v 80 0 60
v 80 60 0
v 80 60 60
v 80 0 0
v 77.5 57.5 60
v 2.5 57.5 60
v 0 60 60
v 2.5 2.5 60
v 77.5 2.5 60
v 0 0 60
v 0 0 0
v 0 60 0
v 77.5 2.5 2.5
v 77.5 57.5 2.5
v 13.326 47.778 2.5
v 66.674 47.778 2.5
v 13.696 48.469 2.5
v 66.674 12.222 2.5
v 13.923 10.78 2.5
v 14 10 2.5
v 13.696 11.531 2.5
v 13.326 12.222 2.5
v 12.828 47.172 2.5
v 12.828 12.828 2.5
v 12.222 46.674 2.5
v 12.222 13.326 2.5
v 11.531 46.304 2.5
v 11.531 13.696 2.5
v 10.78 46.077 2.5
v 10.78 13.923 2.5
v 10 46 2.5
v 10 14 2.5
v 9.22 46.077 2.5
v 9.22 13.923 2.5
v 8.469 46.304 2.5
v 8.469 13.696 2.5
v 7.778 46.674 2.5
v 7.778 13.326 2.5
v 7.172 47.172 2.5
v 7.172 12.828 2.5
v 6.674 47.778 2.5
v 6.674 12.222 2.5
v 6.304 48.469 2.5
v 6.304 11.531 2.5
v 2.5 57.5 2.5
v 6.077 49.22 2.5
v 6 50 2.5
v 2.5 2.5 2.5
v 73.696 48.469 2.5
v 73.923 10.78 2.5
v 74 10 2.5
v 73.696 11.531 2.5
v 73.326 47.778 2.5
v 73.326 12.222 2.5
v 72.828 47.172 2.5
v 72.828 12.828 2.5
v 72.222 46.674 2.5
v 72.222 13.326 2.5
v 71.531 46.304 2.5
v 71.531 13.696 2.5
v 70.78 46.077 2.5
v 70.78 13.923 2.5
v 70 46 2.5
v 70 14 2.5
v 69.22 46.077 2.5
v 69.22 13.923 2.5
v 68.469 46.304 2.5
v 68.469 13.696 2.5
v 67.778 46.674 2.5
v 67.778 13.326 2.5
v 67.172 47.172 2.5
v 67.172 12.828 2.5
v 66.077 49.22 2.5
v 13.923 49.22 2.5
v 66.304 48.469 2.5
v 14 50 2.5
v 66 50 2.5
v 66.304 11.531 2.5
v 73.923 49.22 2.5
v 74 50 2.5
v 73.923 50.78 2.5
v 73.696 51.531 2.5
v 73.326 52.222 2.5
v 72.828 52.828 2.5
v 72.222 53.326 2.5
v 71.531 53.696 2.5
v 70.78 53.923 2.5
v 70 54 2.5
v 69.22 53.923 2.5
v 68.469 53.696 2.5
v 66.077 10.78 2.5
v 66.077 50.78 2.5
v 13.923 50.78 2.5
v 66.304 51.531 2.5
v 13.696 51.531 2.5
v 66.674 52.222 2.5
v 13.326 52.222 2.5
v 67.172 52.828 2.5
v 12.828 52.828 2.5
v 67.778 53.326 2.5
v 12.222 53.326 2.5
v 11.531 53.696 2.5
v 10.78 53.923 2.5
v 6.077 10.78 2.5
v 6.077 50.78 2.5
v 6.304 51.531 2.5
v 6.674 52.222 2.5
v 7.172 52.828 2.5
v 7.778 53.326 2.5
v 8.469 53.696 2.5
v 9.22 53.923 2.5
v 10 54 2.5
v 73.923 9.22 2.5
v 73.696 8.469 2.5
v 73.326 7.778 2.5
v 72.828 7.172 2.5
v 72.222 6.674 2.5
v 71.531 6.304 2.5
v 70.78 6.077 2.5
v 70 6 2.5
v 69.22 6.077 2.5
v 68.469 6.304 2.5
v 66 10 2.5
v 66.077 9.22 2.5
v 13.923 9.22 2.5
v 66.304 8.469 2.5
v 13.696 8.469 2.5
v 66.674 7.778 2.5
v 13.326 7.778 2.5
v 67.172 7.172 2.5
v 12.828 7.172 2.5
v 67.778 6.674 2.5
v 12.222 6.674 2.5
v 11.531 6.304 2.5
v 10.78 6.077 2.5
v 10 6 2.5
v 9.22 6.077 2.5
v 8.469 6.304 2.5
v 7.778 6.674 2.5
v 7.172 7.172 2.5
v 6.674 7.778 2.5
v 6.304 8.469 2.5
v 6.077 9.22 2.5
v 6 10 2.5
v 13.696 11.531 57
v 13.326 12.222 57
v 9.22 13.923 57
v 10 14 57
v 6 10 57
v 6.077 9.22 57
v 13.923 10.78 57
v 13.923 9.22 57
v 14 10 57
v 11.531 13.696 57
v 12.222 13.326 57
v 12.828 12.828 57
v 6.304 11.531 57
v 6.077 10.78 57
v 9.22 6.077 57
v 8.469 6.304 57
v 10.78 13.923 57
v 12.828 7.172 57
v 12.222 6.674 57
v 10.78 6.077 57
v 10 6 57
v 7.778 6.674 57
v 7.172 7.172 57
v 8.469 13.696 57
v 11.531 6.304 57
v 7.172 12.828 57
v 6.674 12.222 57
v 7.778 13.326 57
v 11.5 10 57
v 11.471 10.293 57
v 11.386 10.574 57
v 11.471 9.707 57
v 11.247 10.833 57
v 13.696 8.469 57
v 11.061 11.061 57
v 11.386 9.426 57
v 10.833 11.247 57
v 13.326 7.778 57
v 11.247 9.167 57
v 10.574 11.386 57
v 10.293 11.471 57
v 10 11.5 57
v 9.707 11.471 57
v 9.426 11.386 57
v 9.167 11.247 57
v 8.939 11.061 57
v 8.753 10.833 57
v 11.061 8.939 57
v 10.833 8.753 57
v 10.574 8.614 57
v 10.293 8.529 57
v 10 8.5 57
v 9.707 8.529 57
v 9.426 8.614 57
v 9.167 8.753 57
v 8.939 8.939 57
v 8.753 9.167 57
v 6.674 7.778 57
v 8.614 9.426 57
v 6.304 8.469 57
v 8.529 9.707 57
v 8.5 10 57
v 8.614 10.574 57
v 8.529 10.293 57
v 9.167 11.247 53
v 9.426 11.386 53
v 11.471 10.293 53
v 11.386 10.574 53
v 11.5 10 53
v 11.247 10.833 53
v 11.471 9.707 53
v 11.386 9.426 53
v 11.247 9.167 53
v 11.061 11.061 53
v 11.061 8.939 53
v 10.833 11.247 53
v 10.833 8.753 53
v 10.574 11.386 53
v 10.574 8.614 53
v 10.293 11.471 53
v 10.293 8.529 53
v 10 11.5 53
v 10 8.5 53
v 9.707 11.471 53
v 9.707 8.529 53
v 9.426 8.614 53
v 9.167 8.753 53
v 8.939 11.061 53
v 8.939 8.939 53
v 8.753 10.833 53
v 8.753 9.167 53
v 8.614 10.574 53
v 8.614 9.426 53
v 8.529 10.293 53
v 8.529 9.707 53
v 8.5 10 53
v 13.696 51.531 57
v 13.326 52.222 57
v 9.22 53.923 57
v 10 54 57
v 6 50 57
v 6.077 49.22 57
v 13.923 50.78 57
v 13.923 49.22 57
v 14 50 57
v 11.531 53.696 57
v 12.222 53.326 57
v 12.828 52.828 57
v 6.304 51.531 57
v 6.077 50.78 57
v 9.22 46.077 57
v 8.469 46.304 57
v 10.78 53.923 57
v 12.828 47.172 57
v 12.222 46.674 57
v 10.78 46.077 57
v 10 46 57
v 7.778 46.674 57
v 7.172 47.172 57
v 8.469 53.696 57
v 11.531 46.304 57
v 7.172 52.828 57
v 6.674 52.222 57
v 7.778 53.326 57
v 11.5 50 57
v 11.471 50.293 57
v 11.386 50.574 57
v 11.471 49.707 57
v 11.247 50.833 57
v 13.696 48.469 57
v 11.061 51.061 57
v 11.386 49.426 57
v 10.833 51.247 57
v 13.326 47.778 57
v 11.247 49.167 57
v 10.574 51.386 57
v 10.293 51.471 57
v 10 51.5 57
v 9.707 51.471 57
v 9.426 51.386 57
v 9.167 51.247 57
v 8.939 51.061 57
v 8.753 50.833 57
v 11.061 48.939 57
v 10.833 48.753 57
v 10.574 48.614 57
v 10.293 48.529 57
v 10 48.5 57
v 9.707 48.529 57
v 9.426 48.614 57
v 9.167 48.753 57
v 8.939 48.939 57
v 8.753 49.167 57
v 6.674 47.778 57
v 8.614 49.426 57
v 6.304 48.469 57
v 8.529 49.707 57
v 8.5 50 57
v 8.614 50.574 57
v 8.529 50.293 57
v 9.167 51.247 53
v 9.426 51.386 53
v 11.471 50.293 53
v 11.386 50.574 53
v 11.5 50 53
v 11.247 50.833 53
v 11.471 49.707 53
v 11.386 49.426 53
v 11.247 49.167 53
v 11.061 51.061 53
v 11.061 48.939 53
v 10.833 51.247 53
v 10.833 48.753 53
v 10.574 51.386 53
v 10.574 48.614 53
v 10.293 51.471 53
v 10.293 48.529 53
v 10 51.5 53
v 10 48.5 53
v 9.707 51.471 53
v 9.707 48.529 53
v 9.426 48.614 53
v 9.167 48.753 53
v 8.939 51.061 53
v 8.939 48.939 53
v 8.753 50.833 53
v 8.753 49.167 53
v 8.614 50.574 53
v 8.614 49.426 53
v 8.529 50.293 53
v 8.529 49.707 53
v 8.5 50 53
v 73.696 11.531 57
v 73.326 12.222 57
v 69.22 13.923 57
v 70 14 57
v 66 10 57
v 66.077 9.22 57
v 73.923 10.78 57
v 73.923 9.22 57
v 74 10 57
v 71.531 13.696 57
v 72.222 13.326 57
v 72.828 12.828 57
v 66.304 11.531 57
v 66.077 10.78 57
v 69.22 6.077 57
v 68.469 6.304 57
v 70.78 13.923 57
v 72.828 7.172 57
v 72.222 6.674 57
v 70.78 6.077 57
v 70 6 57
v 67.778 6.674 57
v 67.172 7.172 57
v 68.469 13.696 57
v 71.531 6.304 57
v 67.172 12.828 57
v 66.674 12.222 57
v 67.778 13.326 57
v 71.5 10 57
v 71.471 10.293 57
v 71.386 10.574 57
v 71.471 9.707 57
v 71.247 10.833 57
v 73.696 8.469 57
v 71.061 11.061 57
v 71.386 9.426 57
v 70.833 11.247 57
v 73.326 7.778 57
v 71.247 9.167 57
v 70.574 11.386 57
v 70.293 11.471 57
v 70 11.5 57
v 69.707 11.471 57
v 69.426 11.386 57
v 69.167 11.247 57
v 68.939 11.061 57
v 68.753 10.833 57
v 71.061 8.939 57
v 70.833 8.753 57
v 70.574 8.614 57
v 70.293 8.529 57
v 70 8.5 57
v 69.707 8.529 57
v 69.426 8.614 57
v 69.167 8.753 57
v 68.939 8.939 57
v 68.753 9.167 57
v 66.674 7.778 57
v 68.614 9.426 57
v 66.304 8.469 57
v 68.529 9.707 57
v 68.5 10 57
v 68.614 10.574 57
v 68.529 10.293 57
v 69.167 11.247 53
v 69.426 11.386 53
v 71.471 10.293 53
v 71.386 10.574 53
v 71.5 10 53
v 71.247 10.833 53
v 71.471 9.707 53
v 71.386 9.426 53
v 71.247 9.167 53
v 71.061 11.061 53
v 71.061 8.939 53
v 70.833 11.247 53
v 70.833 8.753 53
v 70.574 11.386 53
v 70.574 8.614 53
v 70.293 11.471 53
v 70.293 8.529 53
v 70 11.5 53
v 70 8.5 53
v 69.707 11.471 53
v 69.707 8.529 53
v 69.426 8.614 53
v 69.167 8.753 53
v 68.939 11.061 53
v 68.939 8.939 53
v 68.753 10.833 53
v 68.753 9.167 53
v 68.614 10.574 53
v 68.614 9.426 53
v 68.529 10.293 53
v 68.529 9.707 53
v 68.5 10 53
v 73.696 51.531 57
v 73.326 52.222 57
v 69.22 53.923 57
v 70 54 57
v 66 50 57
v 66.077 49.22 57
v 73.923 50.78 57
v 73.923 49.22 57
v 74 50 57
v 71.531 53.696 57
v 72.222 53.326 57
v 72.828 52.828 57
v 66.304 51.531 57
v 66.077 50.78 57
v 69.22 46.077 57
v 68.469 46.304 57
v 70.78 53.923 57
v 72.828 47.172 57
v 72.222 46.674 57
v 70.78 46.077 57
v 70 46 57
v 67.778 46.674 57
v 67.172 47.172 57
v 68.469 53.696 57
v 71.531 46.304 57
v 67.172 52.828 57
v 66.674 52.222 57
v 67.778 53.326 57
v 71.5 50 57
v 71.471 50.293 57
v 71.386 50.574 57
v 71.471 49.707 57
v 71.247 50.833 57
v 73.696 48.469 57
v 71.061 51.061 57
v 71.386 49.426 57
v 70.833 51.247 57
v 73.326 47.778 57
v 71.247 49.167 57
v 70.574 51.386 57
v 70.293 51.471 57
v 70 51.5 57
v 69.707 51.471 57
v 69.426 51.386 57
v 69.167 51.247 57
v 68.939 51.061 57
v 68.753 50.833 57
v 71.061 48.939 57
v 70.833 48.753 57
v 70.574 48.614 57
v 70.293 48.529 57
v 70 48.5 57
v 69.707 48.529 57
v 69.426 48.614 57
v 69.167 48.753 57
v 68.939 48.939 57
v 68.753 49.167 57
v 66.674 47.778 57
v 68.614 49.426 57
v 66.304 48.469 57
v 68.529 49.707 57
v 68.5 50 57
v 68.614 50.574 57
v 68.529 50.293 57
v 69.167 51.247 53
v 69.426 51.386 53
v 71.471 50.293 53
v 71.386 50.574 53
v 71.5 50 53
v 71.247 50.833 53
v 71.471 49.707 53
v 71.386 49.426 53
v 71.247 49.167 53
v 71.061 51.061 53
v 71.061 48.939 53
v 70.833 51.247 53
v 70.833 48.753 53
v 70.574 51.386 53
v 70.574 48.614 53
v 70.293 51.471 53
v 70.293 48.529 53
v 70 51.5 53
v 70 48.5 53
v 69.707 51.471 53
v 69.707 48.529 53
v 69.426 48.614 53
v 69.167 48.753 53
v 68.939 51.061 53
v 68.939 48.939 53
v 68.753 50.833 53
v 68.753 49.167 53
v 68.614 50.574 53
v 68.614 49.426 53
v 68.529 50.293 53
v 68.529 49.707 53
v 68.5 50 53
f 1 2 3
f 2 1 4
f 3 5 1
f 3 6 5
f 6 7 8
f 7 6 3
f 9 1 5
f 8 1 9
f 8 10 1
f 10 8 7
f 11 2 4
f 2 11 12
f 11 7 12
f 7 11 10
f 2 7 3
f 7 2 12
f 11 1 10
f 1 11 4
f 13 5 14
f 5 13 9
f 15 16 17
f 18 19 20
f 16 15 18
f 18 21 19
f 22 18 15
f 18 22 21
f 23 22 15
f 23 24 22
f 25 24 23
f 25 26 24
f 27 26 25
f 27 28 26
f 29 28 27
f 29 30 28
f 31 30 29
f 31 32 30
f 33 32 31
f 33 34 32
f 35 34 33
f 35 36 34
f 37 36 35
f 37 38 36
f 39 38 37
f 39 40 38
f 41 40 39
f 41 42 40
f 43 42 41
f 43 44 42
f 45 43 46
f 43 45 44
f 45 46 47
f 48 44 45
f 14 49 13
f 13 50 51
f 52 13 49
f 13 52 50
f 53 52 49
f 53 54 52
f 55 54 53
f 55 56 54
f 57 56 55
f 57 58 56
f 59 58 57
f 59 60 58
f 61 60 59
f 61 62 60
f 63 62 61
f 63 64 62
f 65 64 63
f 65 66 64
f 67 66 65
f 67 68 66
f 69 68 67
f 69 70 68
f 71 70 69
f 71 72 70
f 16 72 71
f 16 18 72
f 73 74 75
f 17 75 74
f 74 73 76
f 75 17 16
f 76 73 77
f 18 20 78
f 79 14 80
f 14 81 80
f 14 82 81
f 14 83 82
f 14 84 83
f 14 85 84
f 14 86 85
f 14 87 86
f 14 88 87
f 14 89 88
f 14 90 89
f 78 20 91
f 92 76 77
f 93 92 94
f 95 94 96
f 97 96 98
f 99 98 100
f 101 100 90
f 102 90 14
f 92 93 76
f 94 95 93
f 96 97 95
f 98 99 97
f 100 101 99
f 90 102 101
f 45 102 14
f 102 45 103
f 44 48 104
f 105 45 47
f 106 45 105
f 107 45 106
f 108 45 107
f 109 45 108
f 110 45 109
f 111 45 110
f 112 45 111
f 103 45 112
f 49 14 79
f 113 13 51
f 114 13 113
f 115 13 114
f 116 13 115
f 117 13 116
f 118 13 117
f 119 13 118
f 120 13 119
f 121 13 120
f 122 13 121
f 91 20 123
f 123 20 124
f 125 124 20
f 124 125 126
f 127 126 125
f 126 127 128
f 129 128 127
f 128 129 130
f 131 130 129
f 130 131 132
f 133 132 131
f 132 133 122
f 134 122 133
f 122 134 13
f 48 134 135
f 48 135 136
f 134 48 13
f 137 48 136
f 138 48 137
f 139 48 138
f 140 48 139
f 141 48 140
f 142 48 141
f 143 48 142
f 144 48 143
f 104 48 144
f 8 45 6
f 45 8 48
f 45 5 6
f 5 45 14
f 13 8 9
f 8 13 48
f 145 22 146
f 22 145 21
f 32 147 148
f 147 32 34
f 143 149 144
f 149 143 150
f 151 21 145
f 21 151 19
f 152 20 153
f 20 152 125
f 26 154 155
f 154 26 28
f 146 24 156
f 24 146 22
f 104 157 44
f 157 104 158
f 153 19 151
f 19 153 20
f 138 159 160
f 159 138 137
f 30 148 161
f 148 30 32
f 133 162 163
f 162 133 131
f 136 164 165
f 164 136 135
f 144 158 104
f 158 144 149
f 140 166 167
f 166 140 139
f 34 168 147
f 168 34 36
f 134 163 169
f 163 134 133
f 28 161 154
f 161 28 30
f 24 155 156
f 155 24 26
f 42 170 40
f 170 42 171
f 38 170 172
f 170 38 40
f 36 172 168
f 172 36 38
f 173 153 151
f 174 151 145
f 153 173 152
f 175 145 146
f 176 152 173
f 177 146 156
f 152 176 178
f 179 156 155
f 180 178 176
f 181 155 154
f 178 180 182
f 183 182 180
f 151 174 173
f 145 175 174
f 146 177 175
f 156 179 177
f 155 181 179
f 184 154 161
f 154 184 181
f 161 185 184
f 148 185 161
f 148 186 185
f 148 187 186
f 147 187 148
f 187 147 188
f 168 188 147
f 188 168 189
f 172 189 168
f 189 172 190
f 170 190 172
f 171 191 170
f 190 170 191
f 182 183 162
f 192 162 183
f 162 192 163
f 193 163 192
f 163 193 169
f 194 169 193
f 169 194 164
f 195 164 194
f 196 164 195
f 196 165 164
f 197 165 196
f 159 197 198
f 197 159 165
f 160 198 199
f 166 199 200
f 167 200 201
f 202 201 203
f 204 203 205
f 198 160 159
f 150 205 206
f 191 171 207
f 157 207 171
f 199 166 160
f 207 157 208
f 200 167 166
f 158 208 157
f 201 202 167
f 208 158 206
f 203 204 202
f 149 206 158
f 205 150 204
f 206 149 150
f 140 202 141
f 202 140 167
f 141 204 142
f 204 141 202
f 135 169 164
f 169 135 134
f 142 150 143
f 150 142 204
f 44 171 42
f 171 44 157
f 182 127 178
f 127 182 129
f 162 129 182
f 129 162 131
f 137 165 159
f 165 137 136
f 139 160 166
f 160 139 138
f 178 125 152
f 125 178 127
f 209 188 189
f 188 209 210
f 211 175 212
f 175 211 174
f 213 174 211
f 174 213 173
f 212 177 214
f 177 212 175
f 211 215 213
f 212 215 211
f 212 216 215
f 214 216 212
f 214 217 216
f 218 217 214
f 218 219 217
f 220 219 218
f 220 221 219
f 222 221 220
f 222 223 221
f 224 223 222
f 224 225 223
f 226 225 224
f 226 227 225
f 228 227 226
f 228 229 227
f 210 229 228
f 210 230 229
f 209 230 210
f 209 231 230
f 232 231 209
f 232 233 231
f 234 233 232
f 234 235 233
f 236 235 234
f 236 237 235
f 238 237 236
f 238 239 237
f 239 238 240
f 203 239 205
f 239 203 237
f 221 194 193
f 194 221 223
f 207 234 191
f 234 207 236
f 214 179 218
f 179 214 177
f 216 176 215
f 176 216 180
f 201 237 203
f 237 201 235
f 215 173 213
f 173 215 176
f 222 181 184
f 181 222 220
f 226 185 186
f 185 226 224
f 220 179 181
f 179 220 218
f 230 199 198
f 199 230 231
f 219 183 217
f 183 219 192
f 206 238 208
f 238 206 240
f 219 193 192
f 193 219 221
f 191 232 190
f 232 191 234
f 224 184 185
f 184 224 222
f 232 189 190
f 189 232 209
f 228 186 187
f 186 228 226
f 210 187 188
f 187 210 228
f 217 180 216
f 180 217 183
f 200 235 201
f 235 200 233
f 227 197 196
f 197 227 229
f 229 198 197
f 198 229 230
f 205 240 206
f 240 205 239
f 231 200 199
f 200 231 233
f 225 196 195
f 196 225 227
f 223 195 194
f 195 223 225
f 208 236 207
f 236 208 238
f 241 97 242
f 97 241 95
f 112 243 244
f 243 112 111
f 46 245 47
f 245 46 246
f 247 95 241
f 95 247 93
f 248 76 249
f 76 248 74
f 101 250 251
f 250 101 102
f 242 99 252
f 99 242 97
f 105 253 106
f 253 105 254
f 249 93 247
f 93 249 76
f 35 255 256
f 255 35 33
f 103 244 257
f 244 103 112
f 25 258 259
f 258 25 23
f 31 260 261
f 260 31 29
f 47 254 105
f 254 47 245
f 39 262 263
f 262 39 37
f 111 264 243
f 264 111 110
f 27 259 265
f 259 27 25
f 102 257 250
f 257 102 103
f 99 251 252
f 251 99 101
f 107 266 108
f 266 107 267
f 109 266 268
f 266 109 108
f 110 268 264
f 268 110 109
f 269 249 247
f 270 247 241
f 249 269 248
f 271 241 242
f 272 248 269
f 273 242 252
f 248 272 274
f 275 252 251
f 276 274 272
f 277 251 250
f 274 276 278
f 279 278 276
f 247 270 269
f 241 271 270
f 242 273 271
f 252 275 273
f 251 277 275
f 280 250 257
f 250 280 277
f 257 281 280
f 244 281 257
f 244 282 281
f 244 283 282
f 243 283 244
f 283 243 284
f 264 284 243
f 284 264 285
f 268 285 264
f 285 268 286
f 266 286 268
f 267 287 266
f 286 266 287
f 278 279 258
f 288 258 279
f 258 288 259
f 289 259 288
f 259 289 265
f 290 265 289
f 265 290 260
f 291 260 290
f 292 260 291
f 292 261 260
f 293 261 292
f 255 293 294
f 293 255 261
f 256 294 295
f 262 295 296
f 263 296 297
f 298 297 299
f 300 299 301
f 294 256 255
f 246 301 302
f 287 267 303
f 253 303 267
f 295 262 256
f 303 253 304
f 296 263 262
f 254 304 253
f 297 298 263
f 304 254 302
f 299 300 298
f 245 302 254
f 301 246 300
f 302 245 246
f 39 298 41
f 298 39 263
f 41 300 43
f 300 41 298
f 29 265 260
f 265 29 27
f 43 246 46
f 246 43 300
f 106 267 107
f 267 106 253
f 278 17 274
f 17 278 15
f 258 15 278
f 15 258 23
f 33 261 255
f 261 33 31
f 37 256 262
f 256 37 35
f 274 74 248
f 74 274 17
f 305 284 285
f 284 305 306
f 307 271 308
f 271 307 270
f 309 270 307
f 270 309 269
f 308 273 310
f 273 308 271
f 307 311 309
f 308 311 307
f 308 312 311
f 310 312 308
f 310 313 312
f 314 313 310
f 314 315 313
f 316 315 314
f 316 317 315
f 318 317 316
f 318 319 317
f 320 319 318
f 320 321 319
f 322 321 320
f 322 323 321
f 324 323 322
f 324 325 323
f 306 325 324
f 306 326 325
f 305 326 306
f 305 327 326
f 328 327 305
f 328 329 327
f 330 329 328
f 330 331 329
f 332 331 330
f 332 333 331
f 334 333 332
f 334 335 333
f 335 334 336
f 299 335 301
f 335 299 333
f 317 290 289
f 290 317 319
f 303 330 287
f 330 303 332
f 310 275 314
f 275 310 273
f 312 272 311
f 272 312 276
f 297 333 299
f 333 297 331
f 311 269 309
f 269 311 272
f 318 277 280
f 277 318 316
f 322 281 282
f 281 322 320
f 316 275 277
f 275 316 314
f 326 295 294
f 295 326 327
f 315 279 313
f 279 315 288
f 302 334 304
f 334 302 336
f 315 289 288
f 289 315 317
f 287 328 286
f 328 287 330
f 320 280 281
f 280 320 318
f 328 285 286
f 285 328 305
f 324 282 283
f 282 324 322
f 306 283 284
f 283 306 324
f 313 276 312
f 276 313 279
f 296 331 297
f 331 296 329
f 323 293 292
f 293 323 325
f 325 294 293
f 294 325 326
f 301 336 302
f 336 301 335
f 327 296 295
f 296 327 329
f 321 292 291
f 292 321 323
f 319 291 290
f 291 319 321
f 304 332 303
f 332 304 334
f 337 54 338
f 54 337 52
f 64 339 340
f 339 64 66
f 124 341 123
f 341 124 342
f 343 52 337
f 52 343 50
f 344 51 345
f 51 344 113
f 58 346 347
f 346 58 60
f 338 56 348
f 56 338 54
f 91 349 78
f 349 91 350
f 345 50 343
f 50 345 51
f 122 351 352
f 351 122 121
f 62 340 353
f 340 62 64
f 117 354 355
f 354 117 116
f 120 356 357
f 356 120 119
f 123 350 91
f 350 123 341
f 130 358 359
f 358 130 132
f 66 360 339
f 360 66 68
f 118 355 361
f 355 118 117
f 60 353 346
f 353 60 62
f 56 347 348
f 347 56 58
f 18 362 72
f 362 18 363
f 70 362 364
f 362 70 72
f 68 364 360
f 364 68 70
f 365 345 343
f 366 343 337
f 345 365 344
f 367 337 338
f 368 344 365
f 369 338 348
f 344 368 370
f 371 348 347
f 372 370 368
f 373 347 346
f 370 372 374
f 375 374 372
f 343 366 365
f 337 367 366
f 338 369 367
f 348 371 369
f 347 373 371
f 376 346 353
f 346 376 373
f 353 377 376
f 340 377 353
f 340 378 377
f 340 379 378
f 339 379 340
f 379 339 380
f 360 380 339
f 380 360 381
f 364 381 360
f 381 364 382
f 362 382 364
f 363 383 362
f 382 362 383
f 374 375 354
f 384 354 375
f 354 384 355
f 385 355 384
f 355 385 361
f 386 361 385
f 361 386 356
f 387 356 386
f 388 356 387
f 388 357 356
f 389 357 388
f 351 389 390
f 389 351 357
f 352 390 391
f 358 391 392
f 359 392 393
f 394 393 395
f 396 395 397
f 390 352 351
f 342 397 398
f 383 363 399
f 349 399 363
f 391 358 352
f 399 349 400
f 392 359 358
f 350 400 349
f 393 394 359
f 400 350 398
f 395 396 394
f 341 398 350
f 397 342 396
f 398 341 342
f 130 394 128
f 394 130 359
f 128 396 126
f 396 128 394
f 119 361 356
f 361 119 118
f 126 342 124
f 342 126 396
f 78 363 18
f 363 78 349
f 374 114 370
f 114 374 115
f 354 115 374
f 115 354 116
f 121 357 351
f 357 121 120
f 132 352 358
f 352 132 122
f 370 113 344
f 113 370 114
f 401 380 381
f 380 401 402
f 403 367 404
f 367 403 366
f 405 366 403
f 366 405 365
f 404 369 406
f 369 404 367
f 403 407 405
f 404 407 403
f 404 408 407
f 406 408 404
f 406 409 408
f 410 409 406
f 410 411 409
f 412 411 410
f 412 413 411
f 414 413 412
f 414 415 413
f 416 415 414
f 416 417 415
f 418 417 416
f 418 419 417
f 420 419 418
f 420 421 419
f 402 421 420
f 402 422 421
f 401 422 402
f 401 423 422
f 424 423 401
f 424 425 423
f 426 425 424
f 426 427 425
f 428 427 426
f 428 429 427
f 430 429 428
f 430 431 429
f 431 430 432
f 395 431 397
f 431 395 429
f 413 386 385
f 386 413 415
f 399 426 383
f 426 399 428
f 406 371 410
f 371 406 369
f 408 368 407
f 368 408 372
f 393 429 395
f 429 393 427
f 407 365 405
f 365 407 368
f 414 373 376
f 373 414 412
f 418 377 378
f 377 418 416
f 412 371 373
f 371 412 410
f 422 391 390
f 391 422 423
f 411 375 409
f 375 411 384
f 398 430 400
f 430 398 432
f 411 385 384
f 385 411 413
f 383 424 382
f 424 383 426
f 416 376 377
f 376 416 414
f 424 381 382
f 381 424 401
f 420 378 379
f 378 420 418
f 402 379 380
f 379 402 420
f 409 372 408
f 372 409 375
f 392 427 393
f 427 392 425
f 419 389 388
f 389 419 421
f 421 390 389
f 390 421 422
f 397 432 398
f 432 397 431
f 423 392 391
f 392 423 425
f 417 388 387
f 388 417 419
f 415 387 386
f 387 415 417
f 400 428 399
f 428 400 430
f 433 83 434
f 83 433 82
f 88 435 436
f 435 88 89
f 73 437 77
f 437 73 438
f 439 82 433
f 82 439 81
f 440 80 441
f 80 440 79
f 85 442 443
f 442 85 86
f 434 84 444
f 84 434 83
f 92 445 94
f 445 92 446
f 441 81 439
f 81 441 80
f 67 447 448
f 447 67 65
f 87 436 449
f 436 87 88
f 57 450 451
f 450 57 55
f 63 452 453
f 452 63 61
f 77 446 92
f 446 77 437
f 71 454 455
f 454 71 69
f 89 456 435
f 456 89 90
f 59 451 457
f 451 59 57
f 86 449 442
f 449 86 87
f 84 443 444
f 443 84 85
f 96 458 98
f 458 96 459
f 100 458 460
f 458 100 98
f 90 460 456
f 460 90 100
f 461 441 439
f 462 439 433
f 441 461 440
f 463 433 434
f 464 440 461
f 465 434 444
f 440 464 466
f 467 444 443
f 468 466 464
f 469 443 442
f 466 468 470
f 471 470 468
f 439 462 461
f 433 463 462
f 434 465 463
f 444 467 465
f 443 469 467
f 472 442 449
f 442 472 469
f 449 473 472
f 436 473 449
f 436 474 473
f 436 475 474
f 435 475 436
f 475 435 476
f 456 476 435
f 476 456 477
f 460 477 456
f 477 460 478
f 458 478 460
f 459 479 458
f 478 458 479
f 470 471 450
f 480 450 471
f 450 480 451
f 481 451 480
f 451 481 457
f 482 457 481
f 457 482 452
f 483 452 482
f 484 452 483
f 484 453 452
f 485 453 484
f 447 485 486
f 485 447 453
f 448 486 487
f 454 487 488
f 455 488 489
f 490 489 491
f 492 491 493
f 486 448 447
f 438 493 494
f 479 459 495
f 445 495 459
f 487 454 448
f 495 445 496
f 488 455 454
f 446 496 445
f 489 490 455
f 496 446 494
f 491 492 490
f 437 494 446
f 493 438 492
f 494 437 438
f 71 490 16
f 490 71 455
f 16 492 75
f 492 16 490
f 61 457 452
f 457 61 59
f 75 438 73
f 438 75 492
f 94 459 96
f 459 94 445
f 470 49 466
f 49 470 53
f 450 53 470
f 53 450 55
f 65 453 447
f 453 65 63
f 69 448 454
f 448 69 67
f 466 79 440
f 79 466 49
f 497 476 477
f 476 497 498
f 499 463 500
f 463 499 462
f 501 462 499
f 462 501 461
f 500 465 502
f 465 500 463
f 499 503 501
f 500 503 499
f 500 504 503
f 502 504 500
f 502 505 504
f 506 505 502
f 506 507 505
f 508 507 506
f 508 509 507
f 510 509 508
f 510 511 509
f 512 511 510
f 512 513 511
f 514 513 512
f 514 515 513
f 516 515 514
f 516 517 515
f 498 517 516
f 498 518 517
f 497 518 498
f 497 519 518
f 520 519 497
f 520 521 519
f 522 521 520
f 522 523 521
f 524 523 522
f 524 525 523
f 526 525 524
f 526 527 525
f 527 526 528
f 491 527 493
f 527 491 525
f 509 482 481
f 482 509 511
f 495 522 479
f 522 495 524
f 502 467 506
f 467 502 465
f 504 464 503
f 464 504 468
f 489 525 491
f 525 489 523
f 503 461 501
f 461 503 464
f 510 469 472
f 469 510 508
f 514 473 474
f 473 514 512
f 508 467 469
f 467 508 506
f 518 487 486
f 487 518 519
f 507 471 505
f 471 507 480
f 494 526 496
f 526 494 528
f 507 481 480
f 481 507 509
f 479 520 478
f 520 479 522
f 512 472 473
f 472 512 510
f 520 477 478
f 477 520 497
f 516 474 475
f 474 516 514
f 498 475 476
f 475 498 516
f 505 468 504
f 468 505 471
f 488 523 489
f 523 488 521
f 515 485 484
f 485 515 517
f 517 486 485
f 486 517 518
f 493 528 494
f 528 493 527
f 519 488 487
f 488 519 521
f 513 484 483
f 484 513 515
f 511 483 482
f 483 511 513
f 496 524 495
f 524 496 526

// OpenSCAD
$fn = 32;

// ----------------------------------------------------------------------
// Enclosure box: bosses enclosure
// ----------------------------------------------------------------------

// --- parameters (mm) ---
box_l = 80;               // outer length, X
box_w = 60;               // outer width, Y
box_h = 60;               // outer height
wall_t = 2.5;             // wall thickness
boss_r = 4;               // corner boss radius
hole_r = 1.5;             // boss screw hole radius
boss_in = 10;             // boss inset from the corners

inner_h = box_h - wall_t;  // cavity depth
boss_h = inner_h - 2;  // corner boss height

difference() {
  union() {
    difference() {
      cube([box_l, box_w, box_h]);
      translate([wall_t, wall_t, wall_t])
        cube([box_l - 2 * wall_t, box_w - 2 * wall_t, box_h]);
    }
    for (sx = [0, 1], sy = [0, 1])
      translate([sx ? box_l - boss_in : boss_in,
                 sy ? box_w - boss_in : boss_in, wall_t - 1])
        difference() {
          cylinder(r = boss_r, h = boss_h);
          translate([0, 0, boss_h - 4])
            cylinder(r = hole_r, h = 5);
        }
  }
}
